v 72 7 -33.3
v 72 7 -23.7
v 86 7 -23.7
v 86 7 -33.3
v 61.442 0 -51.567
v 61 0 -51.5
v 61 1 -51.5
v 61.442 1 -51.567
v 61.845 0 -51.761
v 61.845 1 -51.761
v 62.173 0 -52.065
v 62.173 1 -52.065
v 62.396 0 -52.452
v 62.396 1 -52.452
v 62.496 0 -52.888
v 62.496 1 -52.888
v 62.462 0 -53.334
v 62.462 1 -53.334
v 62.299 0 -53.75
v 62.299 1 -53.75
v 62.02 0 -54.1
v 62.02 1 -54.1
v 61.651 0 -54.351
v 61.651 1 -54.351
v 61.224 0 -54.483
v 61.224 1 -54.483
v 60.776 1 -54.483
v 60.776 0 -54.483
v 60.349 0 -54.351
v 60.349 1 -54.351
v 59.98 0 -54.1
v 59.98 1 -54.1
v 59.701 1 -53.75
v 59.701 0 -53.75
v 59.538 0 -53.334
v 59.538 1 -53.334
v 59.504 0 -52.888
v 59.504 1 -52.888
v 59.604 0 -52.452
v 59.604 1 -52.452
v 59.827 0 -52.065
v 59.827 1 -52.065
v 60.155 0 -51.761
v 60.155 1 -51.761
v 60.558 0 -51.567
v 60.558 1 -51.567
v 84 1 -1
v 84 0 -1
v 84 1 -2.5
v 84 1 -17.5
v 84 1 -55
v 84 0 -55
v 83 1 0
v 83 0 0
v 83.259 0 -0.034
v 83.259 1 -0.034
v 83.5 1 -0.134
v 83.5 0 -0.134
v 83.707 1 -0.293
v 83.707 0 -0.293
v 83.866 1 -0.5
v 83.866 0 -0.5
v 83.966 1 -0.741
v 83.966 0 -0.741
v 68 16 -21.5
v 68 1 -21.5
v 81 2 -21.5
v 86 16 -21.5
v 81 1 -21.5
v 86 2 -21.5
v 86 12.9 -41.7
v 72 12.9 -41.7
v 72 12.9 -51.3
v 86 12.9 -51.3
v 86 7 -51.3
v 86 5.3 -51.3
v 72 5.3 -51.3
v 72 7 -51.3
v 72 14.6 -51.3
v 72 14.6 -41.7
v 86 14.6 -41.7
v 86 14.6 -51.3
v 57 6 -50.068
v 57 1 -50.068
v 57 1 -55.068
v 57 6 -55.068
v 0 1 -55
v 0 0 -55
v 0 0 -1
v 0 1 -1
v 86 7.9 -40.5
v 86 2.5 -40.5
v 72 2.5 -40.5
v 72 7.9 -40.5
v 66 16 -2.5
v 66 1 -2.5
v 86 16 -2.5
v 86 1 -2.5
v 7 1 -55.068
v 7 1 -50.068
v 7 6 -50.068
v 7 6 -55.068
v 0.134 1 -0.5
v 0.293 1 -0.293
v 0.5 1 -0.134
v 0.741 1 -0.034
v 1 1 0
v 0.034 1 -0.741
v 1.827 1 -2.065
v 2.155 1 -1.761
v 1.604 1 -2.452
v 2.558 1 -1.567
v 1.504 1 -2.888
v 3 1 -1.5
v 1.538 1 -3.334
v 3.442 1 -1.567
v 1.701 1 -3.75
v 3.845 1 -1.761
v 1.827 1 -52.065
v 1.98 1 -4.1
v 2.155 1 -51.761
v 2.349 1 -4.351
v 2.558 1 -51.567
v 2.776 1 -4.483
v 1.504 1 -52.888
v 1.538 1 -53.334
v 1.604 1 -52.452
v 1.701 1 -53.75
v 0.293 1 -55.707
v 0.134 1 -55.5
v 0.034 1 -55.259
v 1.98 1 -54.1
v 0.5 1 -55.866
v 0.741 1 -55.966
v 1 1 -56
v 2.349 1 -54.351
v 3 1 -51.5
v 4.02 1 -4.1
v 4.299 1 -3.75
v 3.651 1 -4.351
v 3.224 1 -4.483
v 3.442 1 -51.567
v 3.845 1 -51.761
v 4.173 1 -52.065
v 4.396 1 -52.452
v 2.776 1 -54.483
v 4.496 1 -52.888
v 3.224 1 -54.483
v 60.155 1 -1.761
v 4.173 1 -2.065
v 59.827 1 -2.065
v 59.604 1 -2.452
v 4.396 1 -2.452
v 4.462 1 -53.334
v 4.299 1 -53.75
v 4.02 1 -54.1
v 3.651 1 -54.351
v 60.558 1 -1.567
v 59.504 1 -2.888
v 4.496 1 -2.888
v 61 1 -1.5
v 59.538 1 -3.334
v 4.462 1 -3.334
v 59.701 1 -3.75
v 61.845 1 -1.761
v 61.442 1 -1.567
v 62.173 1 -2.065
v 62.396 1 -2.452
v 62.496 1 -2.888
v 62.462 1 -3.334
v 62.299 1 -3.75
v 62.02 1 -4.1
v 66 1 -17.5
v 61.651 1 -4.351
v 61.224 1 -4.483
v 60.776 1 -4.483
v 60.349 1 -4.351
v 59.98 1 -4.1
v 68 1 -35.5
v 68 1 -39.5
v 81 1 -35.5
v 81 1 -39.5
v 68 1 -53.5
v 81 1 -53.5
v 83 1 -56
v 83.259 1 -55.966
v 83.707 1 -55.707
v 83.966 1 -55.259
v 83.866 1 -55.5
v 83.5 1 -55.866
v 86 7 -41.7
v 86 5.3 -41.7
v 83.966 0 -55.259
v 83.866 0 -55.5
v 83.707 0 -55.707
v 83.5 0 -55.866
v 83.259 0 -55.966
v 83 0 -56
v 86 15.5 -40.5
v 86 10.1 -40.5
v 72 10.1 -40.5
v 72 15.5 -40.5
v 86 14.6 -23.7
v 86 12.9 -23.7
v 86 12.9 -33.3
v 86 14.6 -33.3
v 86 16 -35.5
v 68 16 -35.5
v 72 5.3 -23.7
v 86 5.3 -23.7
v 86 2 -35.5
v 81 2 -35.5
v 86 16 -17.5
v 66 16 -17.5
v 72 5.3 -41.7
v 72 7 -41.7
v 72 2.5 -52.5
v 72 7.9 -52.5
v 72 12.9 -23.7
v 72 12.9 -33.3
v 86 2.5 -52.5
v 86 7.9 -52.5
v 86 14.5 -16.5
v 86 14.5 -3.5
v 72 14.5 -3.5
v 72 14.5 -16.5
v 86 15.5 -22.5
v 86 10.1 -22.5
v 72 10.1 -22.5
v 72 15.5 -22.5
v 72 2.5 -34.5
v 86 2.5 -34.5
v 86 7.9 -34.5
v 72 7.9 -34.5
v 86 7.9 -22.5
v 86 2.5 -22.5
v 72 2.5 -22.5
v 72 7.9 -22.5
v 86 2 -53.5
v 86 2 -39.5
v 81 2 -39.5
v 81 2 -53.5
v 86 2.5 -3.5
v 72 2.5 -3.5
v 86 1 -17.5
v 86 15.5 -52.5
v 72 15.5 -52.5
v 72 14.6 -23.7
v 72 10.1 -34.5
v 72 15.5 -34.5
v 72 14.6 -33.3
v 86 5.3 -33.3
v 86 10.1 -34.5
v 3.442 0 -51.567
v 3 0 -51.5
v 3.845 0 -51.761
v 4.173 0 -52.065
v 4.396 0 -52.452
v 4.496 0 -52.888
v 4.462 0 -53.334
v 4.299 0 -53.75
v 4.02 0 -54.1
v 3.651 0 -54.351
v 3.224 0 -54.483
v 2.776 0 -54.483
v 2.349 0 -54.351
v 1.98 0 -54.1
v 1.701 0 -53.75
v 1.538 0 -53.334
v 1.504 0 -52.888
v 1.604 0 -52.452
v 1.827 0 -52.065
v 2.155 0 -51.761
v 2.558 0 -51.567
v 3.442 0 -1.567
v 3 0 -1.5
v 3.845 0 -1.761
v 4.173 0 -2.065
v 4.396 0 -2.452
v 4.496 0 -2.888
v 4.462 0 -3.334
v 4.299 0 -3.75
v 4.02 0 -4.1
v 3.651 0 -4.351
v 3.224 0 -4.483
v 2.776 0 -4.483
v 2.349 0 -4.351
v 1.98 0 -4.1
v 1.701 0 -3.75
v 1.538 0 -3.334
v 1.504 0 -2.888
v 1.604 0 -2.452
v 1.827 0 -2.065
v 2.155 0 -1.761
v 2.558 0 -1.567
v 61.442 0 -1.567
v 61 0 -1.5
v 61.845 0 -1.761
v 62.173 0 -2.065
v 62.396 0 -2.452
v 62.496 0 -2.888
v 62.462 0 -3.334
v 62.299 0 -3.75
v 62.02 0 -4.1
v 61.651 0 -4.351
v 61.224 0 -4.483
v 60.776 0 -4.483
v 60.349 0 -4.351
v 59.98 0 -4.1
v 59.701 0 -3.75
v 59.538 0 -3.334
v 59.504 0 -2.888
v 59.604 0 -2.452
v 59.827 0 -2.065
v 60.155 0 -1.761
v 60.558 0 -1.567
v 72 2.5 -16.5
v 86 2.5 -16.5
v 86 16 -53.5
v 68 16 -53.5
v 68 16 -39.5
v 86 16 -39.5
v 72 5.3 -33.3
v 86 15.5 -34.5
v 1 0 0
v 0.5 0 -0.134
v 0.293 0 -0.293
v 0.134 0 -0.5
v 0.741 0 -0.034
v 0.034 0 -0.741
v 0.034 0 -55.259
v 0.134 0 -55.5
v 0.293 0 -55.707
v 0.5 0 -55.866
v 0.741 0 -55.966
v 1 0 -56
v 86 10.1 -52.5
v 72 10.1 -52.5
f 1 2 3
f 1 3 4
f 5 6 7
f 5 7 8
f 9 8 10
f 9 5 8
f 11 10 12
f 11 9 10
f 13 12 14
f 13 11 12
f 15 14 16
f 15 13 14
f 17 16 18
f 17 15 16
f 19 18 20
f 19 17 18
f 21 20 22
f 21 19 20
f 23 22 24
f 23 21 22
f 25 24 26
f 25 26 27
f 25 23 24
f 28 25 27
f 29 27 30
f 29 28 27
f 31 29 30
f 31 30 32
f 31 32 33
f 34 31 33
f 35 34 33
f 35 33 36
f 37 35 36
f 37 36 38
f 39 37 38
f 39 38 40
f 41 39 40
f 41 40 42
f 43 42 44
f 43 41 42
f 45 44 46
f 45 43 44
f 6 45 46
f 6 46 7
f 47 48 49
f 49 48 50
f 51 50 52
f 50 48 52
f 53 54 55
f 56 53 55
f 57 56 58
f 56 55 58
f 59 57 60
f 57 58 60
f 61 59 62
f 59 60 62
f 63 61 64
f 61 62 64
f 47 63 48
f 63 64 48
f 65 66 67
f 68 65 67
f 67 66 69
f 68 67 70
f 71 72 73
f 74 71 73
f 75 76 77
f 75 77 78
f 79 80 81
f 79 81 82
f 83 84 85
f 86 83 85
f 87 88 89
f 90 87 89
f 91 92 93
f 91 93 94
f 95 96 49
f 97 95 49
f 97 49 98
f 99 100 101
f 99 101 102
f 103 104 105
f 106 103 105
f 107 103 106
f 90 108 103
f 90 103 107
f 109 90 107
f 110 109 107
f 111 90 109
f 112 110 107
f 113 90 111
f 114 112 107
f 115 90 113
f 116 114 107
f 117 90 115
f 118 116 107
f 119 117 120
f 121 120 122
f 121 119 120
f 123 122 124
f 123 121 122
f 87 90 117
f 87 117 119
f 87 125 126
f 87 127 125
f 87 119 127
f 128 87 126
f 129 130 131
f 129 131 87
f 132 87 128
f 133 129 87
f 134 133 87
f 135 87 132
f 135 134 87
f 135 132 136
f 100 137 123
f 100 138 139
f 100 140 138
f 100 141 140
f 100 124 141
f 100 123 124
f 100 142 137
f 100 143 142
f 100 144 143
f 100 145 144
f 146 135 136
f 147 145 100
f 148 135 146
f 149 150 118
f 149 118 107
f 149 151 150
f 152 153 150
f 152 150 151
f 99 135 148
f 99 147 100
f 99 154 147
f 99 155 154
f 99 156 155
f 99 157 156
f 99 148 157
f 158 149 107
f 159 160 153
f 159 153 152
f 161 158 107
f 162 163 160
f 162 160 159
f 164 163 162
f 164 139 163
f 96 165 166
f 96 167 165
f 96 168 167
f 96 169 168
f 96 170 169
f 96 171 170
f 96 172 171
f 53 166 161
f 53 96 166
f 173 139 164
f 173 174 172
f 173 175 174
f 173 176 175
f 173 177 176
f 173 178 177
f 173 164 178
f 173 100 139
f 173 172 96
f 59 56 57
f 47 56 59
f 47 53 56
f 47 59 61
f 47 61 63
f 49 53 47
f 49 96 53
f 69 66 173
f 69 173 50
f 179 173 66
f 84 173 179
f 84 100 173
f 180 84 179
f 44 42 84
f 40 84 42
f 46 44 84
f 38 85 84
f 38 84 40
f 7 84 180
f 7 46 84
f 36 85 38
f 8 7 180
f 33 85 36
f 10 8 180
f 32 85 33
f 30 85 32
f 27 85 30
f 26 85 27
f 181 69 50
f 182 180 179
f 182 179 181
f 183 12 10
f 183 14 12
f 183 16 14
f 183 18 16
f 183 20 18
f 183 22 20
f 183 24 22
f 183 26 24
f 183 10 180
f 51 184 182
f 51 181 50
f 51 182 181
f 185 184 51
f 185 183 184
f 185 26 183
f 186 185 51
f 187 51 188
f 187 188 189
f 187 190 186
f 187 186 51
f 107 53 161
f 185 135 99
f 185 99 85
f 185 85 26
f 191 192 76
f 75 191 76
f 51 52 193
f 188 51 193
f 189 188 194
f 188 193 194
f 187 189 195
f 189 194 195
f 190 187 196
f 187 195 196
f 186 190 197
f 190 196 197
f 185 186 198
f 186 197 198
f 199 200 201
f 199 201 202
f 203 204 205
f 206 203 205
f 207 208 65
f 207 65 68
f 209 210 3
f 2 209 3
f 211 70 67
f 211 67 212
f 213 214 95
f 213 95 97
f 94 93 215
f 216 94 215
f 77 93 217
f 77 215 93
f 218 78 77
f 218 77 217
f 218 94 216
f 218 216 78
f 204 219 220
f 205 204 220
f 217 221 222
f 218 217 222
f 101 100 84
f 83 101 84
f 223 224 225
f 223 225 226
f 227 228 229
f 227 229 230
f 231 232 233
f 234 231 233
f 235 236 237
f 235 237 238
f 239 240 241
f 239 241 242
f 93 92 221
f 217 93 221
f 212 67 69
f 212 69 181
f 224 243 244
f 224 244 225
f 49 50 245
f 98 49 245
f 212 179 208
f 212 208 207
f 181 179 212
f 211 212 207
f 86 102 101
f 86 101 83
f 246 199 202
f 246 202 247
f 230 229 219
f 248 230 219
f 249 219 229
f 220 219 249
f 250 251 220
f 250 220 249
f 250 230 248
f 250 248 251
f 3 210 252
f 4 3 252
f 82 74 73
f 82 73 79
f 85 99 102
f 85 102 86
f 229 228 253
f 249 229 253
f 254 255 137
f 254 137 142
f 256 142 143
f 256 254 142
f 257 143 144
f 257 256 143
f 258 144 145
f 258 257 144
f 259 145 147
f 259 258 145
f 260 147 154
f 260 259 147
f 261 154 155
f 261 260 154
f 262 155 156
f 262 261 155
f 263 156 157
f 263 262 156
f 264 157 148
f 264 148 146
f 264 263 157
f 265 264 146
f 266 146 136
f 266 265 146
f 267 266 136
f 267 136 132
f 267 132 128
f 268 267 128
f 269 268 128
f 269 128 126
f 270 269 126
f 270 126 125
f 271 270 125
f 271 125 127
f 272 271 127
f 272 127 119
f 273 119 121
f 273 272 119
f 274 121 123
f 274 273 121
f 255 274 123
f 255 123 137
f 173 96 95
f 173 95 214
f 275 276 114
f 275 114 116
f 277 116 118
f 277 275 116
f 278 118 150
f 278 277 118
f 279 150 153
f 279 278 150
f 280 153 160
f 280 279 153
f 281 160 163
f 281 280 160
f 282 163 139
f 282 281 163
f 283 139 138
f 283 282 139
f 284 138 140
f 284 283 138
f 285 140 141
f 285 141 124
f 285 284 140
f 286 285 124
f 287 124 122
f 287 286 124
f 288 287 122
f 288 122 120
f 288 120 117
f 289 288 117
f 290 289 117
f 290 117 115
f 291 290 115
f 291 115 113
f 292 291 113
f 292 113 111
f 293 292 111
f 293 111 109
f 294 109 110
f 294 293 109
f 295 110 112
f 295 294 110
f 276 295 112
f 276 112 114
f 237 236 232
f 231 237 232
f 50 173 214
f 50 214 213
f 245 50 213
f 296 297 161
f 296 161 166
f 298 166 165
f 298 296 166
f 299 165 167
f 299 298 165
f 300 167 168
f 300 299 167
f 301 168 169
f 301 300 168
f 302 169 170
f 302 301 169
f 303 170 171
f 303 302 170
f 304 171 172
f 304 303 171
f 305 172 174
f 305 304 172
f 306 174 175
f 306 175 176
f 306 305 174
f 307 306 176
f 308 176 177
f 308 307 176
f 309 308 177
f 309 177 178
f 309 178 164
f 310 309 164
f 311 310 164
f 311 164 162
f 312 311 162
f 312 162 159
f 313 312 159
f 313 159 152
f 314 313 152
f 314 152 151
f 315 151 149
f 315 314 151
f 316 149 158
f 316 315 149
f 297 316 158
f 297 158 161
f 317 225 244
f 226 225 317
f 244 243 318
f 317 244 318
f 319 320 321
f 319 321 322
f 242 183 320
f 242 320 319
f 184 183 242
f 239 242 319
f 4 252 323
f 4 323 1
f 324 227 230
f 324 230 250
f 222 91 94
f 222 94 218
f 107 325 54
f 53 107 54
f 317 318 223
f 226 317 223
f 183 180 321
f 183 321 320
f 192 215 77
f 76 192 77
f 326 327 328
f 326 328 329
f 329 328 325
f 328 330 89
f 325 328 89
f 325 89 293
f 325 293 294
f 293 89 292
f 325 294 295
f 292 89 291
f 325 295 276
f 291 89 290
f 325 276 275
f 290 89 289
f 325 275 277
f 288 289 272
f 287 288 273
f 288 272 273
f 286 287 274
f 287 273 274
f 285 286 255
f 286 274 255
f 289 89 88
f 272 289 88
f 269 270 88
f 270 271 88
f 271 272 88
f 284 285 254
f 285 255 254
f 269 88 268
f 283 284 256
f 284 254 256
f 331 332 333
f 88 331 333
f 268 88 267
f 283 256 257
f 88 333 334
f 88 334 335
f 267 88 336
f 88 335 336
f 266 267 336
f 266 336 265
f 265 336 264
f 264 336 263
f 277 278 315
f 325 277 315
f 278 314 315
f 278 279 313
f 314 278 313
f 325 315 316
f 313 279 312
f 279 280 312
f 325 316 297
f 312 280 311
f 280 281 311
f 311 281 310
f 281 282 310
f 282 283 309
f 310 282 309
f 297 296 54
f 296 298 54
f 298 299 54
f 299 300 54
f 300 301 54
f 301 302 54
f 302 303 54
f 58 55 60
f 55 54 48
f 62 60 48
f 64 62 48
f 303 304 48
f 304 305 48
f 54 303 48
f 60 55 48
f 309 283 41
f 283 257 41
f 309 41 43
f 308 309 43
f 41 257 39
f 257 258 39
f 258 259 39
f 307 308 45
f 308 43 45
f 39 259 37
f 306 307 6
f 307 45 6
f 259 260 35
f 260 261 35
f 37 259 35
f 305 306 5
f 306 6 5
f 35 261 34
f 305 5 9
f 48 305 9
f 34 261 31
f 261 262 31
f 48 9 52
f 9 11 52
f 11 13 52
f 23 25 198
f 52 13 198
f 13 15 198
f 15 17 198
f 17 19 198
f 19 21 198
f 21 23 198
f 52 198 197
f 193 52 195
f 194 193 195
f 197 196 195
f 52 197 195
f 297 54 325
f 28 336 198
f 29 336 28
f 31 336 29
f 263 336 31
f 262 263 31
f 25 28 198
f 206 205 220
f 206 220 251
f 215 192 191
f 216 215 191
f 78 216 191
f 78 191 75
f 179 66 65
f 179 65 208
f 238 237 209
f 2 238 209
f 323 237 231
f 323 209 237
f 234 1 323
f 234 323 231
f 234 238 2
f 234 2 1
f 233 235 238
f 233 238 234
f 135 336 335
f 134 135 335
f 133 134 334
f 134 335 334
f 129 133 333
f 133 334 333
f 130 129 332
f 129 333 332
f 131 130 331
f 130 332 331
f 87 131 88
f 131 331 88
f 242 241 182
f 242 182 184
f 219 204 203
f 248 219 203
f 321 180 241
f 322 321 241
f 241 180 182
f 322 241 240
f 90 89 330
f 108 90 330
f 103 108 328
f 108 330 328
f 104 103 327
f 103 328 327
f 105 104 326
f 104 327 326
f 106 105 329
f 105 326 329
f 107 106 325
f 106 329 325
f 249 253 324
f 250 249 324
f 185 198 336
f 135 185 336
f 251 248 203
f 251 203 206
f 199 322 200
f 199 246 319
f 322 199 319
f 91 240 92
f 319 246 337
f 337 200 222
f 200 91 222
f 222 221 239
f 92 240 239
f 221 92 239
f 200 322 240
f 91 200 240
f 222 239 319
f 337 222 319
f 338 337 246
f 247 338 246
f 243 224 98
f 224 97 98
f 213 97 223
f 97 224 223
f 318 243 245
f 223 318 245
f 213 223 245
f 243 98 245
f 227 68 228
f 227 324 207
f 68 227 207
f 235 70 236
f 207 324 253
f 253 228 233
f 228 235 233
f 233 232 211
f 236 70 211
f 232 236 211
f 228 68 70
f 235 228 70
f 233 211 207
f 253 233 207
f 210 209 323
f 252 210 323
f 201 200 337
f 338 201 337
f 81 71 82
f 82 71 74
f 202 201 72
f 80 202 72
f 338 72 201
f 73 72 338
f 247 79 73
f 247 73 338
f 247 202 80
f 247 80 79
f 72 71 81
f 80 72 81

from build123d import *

# Parameters (mm, degrees)
SKETCH_1_R          = 1.5
EXTRUDE_1_DEPTH     = 1
SKETCH_3_W          = 18
SKETCH_3_H          = 14
SKETCH_3_W_2        = 20
SKETCH_3_H_2        = 15
EXTRUDE_2_DEPTH     = 15
SKETCH_4_W          = 12
SKETCH_4_H          = 5.4
SKETCH_4_W_2        = 9.6
SKETCH_4_H_2        = 1.7
CUT_EXTRUDE_1_DEPTH = 14
SKETCH_5_W          = 13
SKETCH_5_H          = 12
CUT_EXTRUDE_2_DEPTH = 14
SKETCH_2_W          = 50
SKETCH_2_H          = 5
EXTRUDE_3_DEPTH     = 5
SKETCH_7_W          = 14
SKETCH_7_H          = 1
CUT_EXTRUDE_5_DEPTH = 5


with BuildPart() as part:
    # Эскиз1 → Бобышка-Вытянуть1 (new body)
    with BuildSketch(Plane(origin=(0, 0, 0), x_dir=(1, 0, 0), z_dir=(0, 1, 0))):
        with BuildLine():
            Line((1, 0), (83, 0))
            ThreePointArc((83, 0), (83.707106781, 0.292893219), (84, 1))
            Line((84, 1), (84, 55))
            ThreePointArc((84, 55), (83.707106781, 55.707106781), (83, 56))
            Line((83, 56), (1, 56))
            ThreePointArc((1, 56), (0.292893219, 55.707106781), (0, 55))
            Line((0, 55), (0, 1))
            ThreePointArc((0, 1), (0.292893219, 0.292893219), (1, 0))
        make_face()
        with Locations(Location((3, 53, 0), (0, 0, 270))):
            Circle(SKETCH_1_R, mode=Mode.SUBTRACT)
        with Locations(Location((61, 53, 0), (0, 0, 270))):
            Circle(SKETCH_1_R, mode=Mode.SUBTRACT)
        with Locations(Location((61, 3, 0), (0, 0, 270))):
            Circle(SKETCH_1_R, mode=Mode.SUBTRACT)
        with Locations(Location((3, 3, 0), (0, 0, 270))):
            Circle(SKETCH_1_R, mode=Mode.SUBTRACT)
    extrude(amount=EXTRUDE_1_DEPTH)

    # Эскиз3 → Бобышка-Вытянуть2 (add)
    with BuildSketch(Plane(origin=(0, 1, 0), x_dir=(1, 0, 0), z_dir=(0, 1, 0))):
        with Locations((77, 28.5)):
            Rectangle(SKETCH_3_W, SKETCH_3_H)
        with Locations((76, 10)):
            Rectangle(SKETCH_3_W_2, SKETCH_3_H_2)
        with Locations((77, 46.5)):
            Rectangle(SKETCH_3_W, SKETCH_3_H)
    extrude(amount=EXTRUDE_2_DEPTH)

    # Эскиз4 → Вырез-Вытянуть1 (cut)
    # profile 1 of 4: a face of its own
    with BuildSketch(Plane(origin=(86, 0, 0), x_dir=(0, 0, -1), z_dir=(1, 0, 0))):
        with Locations((46.5, 12.8)):
            Rectangle(SKETCH_4_W, SKETCH_4_H)
        with Locations((46.5, 13.75)):
            Rectangle(SKETCH_4_W_2, SKETCH_4_H_2, mode=Mode.SUBTRACT)
    # profile 2 of 4: a face of its own
    with BuildSketch(Plane(origin=(86, 0, 0), x_dir=(0, 0, -1), z_dir=(1, 0, 0))):
        with Locations((46.5, 5.2)):
            Rectangle(SKETCH_4_W, SKETCH_4_H)
        with Locations((46.5, 6.15)):
            Rectangle(SKETCH_4_W_2, SKETCH_4_H_2, mode=Mode.SUBTRACT)
    # profile 3 of 4: a face of its own
    with BuildSketch(Plane(origin=(86, 0, 0), x_dir=(0, 0, -1), z_dir=(1, 0, 0))):
        with Locations((28.5, 5.2)):
            Rectangle(SKETCH_4_W, SKETCH_4_H)
        with Locations((28.5, 6.15)):
            Rectangle(SKETCH_4_W_2, SKETCH_4_H_2, mode=Mode.SUBTRACT)
    # profile 4 of 4: a face of its own
    with BuildSketch(Plane(origin=(86, 0, 0), x_dir=(0, 0, -1), z_dir=(1, 0, 0))):
        with Locations((28.5, 12.8)):
            Rectangle(SKETCH_4_W, SKETCH_4_H)
        with Locations((28.5, 13.75)):
            Rectangle(SKETCH_4_W_2, SKETCH_4_H_2, mode=Mode.SUBTRACT)
    extrude(amount=-CUT_EXTRUDE_1_DEPTH, mode=Mode.SUBTRACT)

    # Эскиз5 → Вырез-Вытянуть2 (cut)
    with BuildSketch(Plane(origin=(86, 0, 0), x_dir=(0, 0, -1), z_dir=(1, 0, 0))):
        with Locations((10, 8.5)):
            Rectangle(SKETCH_5_W, SKETCH_5_H)
    extrude(amount=-CUT_EXTRUDE_2_DEPTH, mode=Mode.SUBTRACT)

    # Эскиз2 → Бобышка-Вытянуть3 (add)
    with BuildSketch(Plane(origin=(0, 1, 0), x_dir=(1, 0, 0), z_dir=(0, 1, 0))):
        with Locations((32, 52.567639547)):
            Rectangle(SKETCH_2_W, SKETCH_2_H)
    extrude(amount=EXTRUDE_3_DEPTH)

    # Эскиз7 → Вырез-Вытянуть5 (cut)
    with BuildSketch(Plane(origin=(86, 0, 0), x_dir=(0, 0, -1), z_dir=(1, 0, 0))):
        with Locations((28.5, 1.5)):
            Rectangle(SKETCH_7_W, SKETCH_7_H)
        with Locations((46.5, 1.5)):
            Rectangle(SKETCH_7_W, SKETCH_7_H)
    extrude(amount=-CUT_EXTRUDE_5_DEPTH, mode=Mode.SUBTRACT)


solid = part.part
